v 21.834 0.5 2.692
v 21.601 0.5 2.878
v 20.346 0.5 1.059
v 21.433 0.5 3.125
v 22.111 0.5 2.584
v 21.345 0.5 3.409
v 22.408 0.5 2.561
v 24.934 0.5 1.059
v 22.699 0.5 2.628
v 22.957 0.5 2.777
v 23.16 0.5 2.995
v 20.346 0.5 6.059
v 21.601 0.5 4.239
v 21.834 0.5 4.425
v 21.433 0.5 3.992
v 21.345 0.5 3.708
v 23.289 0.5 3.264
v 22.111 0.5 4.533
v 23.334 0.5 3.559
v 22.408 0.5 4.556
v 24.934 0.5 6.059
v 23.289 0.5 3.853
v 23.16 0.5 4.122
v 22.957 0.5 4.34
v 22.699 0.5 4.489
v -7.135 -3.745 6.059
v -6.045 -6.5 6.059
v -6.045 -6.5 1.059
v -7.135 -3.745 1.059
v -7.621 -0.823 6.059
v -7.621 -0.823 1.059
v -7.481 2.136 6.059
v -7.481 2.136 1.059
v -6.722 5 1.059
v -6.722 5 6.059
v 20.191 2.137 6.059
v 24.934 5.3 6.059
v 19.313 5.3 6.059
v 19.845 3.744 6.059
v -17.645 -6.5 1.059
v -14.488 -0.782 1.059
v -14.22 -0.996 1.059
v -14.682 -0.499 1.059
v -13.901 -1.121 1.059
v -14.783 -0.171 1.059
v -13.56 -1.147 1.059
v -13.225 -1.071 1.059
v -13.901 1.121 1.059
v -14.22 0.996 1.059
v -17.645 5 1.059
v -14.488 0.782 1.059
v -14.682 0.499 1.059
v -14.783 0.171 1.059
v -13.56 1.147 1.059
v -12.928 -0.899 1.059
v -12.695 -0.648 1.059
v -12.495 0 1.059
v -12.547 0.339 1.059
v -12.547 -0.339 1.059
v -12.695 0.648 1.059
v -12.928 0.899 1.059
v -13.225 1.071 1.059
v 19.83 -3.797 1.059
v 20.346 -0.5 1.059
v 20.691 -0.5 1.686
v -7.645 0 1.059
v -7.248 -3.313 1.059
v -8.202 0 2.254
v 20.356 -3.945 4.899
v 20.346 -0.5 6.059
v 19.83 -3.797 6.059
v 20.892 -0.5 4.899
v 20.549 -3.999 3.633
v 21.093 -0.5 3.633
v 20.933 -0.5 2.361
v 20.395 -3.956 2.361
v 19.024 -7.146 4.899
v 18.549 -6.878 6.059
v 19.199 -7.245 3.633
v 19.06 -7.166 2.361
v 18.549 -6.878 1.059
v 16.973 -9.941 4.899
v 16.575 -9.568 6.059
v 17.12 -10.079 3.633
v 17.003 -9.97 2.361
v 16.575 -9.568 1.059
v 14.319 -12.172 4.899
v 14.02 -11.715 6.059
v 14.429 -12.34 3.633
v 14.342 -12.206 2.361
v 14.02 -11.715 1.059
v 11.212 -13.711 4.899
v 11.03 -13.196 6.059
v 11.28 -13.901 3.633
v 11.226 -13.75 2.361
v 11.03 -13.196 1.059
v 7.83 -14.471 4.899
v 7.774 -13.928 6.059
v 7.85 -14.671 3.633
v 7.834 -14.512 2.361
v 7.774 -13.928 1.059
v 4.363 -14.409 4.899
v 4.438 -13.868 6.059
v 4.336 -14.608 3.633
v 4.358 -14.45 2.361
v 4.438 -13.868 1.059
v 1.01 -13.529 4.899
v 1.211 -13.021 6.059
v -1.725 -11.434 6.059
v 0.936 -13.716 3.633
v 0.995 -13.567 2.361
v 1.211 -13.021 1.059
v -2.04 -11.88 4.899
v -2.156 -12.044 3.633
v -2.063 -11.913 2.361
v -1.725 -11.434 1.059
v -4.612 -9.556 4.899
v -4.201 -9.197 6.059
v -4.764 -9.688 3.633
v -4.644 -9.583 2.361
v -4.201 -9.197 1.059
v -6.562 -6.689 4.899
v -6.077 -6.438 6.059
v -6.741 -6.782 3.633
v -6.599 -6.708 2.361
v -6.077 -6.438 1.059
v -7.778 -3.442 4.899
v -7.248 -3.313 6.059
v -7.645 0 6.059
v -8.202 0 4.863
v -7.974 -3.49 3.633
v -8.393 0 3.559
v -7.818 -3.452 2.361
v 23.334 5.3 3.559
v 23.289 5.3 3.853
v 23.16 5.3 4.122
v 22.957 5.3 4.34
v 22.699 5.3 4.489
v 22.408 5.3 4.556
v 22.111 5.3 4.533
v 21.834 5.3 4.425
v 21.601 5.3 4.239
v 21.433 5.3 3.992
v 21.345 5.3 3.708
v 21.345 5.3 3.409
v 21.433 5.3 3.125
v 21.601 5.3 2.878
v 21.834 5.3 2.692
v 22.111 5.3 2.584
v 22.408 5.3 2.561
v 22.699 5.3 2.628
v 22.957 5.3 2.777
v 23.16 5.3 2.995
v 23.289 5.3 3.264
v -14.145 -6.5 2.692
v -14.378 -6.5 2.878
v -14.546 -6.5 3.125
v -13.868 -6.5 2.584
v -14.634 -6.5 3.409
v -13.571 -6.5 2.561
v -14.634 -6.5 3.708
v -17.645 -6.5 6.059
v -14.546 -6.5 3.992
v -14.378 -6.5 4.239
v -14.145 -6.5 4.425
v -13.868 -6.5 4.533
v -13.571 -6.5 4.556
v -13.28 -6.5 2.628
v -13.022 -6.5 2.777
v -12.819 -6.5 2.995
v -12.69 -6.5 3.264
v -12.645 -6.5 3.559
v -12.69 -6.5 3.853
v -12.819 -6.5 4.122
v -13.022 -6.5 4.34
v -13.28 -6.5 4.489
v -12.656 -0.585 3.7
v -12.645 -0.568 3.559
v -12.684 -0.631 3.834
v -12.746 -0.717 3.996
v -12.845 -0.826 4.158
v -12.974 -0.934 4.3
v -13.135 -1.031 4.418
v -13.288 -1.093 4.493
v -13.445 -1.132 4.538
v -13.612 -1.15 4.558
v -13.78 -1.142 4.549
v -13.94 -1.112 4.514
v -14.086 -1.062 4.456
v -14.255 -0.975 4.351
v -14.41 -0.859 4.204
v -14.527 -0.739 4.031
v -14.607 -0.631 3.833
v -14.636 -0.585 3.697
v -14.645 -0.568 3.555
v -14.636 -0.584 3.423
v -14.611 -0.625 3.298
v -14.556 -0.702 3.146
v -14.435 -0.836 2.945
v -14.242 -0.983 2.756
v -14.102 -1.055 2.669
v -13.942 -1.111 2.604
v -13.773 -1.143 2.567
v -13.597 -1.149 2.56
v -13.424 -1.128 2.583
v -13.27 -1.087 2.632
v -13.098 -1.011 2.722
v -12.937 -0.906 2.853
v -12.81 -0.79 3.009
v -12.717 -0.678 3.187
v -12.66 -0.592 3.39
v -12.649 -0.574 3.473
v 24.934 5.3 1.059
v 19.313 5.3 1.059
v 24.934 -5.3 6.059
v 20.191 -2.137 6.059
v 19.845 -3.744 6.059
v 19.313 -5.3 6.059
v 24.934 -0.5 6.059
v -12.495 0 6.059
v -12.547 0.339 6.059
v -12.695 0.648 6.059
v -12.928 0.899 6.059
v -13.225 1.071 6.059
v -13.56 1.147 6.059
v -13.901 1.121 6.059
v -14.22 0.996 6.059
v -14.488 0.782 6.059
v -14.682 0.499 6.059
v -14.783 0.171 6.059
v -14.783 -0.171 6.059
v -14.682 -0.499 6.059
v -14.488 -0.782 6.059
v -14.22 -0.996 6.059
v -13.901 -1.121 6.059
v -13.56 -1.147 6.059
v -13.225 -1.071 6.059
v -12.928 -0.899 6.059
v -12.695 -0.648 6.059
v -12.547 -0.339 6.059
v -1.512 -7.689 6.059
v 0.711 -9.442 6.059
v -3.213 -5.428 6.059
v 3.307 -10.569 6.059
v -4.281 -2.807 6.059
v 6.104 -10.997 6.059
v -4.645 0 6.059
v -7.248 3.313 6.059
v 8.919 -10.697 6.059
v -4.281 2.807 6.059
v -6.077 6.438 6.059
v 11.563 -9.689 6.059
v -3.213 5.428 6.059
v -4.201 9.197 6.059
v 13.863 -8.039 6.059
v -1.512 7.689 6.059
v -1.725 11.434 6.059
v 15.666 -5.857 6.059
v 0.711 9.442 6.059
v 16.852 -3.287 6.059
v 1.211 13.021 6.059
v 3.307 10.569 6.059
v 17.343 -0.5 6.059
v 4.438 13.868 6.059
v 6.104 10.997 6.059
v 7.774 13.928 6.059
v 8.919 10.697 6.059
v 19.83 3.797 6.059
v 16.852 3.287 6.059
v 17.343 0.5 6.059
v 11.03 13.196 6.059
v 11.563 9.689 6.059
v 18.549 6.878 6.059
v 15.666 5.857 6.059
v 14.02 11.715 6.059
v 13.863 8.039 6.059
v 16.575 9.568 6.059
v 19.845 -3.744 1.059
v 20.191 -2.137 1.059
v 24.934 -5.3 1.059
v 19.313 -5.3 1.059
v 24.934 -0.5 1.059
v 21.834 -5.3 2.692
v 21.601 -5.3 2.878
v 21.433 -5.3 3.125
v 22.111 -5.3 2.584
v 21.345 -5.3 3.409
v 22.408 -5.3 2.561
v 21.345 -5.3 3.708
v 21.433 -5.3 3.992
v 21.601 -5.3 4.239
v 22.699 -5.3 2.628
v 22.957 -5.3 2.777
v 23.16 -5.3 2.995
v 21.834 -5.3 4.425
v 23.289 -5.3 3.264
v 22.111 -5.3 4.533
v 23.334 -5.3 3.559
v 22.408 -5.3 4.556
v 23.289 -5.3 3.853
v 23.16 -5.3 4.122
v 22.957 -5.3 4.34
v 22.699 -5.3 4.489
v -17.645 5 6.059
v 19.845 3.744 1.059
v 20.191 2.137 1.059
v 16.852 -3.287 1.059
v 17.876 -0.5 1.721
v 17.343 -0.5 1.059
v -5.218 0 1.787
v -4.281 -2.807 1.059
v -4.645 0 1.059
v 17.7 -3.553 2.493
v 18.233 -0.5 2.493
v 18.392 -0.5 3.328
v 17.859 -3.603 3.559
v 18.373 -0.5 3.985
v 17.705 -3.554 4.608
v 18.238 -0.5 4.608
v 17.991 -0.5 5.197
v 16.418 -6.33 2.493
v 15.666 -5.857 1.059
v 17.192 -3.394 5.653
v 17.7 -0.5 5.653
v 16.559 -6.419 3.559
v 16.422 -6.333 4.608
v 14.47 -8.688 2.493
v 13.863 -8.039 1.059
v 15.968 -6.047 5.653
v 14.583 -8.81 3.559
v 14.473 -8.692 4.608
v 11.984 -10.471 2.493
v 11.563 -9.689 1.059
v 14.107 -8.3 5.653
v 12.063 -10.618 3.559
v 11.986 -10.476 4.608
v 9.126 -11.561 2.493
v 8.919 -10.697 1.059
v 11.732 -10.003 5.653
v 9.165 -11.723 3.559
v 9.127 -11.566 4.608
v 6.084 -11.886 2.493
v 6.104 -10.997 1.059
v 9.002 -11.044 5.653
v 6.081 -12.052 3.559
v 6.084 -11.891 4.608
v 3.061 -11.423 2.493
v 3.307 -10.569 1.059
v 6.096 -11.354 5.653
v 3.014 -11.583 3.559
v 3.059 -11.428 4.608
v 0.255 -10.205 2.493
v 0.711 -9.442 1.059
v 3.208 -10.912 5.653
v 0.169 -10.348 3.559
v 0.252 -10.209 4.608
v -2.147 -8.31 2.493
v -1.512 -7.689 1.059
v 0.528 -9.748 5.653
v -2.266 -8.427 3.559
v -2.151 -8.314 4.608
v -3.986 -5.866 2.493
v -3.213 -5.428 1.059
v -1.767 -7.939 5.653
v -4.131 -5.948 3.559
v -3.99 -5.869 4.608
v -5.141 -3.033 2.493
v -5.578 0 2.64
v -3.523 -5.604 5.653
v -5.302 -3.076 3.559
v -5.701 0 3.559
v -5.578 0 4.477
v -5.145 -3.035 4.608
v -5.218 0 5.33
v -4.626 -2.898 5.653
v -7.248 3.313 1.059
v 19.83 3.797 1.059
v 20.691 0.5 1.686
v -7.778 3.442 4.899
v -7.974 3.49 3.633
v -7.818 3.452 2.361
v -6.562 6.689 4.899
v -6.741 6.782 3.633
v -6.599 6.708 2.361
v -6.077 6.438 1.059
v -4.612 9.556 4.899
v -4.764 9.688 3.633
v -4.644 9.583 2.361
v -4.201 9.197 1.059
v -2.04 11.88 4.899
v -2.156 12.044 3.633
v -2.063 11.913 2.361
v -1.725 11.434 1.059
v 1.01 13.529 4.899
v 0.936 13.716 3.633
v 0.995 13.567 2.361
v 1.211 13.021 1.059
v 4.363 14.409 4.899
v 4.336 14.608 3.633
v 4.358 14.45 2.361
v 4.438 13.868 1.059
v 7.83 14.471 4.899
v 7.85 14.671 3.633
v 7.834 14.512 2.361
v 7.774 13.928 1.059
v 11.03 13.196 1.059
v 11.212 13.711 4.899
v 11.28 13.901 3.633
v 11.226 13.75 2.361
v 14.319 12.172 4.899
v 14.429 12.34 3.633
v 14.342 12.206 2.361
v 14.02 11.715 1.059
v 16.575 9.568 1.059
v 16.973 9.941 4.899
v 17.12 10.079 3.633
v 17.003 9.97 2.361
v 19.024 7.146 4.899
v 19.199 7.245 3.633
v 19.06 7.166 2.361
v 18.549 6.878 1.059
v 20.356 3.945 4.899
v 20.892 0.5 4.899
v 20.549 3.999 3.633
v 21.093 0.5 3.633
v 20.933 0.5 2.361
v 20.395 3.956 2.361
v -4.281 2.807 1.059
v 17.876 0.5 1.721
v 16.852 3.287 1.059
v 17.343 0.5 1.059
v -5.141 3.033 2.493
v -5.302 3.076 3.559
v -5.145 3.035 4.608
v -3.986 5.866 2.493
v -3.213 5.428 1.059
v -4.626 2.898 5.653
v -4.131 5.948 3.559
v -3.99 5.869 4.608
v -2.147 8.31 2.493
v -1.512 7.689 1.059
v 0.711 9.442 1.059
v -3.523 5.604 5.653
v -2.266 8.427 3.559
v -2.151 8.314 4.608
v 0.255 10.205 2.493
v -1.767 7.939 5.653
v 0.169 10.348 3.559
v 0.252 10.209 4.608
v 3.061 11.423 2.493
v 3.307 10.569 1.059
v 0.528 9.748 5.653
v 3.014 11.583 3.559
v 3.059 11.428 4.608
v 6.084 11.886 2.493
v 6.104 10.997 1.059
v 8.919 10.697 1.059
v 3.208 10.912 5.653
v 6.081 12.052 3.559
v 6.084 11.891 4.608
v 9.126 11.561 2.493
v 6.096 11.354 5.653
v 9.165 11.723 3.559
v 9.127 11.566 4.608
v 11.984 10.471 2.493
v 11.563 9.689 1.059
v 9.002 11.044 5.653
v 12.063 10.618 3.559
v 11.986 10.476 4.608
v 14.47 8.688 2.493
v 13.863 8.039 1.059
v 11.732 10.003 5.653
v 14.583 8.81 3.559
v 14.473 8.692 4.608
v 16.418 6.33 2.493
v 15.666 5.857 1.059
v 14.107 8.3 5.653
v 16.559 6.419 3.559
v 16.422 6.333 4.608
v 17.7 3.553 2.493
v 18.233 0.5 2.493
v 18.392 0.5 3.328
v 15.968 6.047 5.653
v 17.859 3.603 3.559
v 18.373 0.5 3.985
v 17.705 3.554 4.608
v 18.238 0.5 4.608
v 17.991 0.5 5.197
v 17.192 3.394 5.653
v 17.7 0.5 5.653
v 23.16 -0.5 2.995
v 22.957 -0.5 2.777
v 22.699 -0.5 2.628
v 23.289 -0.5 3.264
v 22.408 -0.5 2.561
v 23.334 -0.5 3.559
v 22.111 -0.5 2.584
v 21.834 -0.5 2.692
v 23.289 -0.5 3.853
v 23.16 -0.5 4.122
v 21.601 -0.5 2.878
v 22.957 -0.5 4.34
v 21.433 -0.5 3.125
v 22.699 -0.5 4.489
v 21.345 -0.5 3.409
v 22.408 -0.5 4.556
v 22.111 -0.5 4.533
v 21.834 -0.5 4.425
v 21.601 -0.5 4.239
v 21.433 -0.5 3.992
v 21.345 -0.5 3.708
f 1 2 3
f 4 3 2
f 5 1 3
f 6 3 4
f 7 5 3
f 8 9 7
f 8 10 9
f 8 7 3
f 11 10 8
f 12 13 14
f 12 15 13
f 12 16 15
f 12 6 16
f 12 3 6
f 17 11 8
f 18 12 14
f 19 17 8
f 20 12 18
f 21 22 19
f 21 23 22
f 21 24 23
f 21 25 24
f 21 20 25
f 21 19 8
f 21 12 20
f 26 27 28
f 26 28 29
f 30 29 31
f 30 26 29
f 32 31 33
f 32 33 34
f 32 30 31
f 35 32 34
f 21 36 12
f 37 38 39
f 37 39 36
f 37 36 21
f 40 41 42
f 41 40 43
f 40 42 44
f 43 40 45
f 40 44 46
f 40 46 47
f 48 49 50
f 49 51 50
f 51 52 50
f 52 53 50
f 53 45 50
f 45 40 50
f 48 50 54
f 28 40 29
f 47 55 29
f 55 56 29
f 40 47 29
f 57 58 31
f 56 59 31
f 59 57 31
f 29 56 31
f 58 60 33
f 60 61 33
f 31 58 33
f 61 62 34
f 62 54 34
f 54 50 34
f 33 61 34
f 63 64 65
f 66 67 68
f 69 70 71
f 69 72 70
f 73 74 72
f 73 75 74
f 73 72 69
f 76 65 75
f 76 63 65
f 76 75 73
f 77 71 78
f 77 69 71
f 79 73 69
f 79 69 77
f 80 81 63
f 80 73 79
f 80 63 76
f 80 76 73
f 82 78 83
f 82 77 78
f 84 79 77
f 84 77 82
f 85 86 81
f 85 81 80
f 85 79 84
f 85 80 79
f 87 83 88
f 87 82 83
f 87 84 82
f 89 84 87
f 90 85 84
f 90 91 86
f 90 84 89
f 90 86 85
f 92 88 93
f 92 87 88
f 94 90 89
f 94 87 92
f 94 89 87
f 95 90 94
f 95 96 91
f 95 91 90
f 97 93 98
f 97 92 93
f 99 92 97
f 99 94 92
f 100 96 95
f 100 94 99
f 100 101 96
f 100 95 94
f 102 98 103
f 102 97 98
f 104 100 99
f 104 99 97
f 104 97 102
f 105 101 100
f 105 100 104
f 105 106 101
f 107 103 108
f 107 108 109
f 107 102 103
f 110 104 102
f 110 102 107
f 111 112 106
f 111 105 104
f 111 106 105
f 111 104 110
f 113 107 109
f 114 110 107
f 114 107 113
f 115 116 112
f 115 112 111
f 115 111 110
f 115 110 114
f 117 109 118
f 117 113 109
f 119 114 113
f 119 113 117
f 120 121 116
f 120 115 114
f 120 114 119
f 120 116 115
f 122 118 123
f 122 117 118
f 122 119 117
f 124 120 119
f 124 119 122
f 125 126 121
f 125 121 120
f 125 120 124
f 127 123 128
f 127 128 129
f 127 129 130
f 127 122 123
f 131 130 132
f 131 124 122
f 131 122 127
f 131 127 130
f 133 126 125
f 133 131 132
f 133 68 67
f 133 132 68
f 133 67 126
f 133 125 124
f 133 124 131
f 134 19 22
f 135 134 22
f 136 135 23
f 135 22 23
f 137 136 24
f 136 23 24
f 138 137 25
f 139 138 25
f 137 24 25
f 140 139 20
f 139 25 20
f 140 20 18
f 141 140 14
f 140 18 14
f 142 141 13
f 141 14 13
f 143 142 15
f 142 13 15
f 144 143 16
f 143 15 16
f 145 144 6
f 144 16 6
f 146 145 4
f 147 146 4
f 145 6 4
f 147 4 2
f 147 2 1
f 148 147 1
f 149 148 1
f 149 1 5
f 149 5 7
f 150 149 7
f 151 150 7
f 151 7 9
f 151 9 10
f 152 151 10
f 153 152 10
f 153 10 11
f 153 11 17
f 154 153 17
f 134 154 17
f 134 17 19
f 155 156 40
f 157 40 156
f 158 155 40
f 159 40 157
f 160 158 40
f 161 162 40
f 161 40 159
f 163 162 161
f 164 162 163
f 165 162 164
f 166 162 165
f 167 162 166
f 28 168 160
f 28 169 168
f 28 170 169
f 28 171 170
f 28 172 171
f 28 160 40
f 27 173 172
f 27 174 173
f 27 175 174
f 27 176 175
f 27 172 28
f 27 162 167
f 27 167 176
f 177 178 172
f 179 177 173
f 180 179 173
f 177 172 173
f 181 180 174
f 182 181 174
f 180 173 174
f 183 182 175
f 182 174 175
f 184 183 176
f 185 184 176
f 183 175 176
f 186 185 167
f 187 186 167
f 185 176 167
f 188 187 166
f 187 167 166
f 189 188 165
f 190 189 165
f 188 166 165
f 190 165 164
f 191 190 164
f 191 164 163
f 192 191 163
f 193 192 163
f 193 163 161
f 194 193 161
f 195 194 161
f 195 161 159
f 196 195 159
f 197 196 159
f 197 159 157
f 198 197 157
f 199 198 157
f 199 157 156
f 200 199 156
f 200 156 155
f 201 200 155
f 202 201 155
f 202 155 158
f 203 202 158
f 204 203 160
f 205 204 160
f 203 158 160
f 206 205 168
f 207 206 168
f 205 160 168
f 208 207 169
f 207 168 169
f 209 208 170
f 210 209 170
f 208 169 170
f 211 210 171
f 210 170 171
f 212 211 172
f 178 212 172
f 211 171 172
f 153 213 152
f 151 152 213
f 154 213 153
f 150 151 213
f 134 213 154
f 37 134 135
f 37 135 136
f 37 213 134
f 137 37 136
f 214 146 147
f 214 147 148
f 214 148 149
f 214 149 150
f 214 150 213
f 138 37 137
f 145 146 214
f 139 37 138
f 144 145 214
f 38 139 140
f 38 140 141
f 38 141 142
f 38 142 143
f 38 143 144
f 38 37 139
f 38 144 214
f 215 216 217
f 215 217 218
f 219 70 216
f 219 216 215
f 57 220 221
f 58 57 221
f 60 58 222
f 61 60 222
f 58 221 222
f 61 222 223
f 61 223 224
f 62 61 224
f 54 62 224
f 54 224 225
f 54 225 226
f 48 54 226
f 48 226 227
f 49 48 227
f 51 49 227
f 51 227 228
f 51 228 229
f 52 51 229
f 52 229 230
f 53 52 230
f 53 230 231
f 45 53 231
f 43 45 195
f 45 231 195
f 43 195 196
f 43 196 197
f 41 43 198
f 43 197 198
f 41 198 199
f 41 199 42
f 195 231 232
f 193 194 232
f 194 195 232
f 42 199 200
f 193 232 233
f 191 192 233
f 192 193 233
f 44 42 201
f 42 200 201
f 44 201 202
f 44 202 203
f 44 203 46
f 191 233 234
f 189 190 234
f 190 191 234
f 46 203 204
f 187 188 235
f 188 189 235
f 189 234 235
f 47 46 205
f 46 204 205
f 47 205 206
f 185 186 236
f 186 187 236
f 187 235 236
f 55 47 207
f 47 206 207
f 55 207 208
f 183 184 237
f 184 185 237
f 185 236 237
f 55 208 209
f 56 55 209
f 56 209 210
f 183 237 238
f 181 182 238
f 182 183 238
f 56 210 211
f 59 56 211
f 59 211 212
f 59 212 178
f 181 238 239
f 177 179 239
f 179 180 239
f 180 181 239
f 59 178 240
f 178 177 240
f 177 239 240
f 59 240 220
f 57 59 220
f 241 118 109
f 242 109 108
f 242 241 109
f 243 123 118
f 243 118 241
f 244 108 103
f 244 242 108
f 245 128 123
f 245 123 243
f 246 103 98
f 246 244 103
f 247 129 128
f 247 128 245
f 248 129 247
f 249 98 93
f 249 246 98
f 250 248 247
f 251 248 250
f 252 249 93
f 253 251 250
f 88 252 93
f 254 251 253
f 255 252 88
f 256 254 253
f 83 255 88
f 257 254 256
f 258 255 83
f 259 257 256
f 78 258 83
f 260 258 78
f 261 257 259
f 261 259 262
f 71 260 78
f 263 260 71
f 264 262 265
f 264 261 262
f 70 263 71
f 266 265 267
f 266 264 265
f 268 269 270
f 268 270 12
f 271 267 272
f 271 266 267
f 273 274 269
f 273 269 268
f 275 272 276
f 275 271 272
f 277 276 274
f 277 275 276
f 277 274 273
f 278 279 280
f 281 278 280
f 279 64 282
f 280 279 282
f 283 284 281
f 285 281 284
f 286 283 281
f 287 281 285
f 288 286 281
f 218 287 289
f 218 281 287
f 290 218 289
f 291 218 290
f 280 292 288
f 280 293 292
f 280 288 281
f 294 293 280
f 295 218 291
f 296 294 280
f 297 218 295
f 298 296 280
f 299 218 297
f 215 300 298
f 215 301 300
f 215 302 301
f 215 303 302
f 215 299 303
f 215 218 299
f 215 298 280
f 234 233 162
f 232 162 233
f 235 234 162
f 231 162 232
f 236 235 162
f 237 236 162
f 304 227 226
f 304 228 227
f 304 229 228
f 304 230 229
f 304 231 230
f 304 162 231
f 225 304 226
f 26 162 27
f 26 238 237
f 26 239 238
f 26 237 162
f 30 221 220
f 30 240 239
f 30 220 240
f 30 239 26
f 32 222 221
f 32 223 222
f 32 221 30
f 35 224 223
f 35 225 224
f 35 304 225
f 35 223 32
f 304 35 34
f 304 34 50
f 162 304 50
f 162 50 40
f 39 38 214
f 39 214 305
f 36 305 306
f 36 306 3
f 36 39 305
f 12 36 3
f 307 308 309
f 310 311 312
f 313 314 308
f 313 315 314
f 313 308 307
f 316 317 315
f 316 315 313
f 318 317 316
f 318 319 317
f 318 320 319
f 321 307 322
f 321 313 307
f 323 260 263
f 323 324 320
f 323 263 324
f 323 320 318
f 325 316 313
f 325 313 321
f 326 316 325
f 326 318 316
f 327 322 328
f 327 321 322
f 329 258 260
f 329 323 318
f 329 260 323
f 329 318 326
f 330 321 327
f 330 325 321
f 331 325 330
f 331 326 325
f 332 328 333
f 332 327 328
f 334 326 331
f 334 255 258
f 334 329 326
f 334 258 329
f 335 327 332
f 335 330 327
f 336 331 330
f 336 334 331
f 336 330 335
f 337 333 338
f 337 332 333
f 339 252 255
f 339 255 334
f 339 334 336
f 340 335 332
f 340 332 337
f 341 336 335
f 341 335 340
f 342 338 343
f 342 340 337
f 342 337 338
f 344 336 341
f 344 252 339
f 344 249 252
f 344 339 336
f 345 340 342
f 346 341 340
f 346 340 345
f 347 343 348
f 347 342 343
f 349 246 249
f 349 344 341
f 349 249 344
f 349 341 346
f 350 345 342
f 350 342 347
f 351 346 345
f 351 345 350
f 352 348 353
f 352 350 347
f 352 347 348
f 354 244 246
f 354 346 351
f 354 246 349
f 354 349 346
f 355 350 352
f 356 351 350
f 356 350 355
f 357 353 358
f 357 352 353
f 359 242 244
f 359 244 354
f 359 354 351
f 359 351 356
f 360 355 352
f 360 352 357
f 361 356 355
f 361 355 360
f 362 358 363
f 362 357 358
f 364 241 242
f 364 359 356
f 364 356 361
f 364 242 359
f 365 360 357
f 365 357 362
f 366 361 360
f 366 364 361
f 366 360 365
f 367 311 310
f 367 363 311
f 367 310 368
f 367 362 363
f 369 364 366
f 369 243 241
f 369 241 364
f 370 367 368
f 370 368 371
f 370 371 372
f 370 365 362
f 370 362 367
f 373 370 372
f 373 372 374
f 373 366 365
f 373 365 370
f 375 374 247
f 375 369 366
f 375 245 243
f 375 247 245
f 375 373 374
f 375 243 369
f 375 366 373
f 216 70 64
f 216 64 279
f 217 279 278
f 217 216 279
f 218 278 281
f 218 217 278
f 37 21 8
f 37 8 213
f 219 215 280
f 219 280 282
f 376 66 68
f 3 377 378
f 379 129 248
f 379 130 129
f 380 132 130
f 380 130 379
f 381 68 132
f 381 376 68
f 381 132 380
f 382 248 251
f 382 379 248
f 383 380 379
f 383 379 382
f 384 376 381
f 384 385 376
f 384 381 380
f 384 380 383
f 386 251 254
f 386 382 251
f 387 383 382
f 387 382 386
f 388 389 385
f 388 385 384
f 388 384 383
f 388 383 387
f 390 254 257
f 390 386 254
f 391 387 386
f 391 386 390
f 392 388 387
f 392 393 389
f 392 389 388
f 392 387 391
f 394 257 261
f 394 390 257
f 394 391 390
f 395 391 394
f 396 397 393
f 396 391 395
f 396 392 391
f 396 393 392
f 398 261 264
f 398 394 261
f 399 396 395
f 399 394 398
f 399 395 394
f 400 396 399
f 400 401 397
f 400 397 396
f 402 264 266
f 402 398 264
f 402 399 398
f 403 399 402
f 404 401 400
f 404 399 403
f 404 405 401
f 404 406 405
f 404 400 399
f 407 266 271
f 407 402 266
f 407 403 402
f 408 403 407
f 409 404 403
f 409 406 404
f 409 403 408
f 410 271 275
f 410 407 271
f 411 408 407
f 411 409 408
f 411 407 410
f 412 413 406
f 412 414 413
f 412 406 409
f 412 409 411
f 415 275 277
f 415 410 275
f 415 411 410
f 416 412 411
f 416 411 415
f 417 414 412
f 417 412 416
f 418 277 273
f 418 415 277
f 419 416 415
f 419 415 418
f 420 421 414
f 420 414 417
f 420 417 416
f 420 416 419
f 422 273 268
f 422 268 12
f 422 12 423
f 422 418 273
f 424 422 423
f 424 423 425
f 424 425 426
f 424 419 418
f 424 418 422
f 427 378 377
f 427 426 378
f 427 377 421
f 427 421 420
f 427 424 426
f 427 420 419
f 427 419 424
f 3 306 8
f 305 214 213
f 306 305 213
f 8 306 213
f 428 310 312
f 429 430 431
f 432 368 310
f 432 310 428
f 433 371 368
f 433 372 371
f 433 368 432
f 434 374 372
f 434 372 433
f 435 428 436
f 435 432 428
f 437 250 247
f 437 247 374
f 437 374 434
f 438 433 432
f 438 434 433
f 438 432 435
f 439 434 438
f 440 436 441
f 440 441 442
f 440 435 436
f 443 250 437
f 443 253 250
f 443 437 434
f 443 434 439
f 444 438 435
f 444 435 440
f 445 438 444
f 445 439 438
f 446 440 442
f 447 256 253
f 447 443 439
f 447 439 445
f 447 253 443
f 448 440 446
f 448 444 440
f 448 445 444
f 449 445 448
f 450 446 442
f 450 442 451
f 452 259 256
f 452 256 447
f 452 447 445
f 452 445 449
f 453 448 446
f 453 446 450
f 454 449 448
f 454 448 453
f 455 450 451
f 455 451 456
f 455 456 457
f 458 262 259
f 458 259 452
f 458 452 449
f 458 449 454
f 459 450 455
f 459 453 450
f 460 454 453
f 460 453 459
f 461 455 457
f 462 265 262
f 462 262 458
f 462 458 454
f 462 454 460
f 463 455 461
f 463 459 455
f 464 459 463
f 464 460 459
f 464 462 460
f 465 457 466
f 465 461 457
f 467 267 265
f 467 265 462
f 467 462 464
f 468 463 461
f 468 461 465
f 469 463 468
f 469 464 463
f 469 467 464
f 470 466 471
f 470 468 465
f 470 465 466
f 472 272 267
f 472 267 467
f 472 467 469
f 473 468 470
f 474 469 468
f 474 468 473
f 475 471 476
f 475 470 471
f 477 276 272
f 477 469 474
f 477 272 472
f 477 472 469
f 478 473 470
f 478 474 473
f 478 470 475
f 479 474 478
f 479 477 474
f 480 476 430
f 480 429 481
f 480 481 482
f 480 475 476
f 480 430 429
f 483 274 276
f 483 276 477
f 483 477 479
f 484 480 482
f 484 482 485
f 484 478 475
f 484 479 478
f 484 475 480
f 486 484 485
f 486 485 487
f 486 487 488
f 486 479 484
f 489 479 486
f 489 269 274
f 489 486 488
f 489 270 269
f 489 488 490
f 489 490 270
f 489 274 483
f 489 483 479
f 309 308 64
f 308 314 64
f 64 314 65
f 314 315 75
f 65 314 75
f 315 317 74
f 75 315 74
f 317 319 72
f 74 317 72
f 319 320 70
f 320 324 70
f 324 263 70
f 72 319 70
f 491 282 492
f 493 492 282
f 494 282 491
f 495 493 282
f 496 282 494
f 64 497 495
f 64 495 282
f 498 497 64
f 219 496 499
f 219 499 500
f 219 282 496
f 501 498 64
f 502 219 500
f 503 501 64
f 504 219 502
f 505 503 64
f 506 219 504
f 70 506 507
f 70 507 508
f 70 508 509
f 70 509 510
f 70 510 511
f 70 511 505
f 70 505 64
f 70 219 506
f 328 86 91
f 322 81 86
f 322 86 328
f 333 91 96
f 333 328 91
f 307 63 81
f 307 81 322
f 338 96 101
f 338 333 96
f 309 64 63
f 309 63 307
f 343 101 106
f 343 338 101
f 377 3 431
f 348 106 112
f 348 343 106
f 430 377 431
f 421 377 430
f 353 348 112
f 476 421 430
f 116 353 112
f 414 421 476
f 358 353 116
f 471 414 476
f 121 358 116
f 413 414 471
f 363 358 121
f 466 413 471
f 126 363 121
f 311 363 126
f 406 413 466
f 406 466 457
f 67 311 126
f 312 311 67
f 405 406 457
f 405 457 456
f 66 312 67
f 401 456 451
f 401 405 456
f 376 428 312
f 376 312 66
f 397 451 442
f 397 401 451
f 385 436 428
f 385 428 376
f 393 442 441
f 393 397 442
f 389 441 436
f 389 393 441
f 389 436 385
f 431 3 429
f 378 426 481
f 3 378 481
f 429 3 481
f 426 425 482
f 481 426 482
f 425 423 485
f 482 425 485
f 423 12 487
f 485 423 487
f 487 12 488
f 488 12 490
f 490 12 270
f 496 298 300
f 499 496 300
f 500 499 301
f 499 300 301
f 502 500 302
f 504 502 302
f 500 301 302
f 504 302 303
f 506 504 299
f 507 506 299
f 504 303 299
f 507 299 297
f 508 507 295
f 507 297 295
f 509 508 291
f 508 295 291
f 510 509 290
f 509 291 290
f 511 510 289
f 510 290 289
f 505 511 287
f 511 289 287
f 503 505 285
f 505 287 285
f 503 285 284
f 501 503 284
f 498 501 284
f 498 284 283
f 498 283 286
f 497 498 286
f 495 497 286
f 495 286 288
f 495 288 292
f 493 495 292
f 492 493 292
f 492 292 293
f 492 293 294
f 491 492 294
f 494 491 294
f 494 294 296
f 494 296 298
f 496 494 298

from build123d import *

# Parameters (mm, degrees)
F2_R      = 1.15
F3_DEPTH  = 5
F4_R      = 1
F5_DEPTH  = 6
F6_R      = 1
F7_DEPTH  = 25
F8_R      = 1
F9_DEPTH  = 25
F11_DEPTH = 25


with BuildPart() as f1:
    # F0 (on Front) → F1 (revolve)
    with BuildSketch(Plane.XZ):
        with BuildLine():
            ThreePointArc((-4.645441286, 1.0585224686), (-5.700841589, 3.5585224686), (-4.645441286, 6.0585224686))
            ThreePointArc((-4.645441286, 6.0585224686), (-7.145441286, 3.5585224686), (-4.645441286, 1.0585224686))
        make_face()
        with BuildLine():
            ThreePointArc((-4.645441286, 1.0585224686), (-7.145441286, 3.5585224686), (-4.645441286, 6.0585224686))
            Line((-4.645441286, 6.0585224686), (-7.645441286, 6.0585224686))
            Line((-7.645441286, 6.0585224686), (-7.645441286, 1.0585224686))
            Line((-7.645441286, 1.0585224686), (-4.645441286, 1.0585224686))
        make_face()
        with BuildLine():
            Line((-7.645441286, 1.0585224686), (-7.645441286, 6.0585224686))
            ThreePointArc((-7.645441286, 6.0585224686), (-8.3932641999, 3.5585224686), (-7.645441286, 1.0585224686))
        make_face()
    revolve(axis=Axis((6.354558714, 0, 2.7198808384), (0, 0, -1)))

    # F8 (on face) → F9 (cut)
    with BuildSketch(Plane(origin=(0, 5.3, 0), x_dir=(-1, 0, 0), z_dir=(0, 1, 0))):
        with Locations((-22.3337602671, 3.5585224686)):
            Circle(F8_R)
    extrude(amount=-F9_DEPTH, mode=Mode.SUBTRACT)

    # F10 (on face) → F11 (cut)
    with BuildSketch(Plane.XY.offset(6.0585224686)):
        with BuildLine():
            ThreePointArc((20.354558714, 0), (20.3523256808, 0.250039882), (20.3456272937, 0.5))
            Line((20.3456272937, 0.5), (17.3431892019, 0.5))
            ThreePointArc((17.3431892019, 0.5), (17.3517159687, 0.2500646245), (17.354558714, 0))
            ThreePointArc((17.354558714, 0), (17.3517159687, -0.2500646245), (17.3431892019, -0.5))
            Line((17.3431892019, -0.5), (20.3456272937, -0.5))
            ThreePointArc((20.3456272937, -0.5), (20.3523256808, -0.250039882), (20.354558714, 0))
        make_face()
        with BuildLine():
            Line((21.9472598002, -0.5), (21.9472598002, 0.5))
            Line((21.9472598002, 0.5), (20.3456272937, 0.5))
            ThreePointArc((20.3456272937, 0.5), (20.3523256808, 0.250039882), (20.354558714, 0))
            ThreePointArc((20.354558714, 0), (20.3523256808, -0.250039882), (20.3456272937, -0.5))
            Line((20.3456272937, -0.5), (21.9472598002, -0.5))
        make_face()
    extrude(amount=-F11_DEPTH, mode=Mode.SUBTRACT)


with BuildPart() as f3:
    # F2 (on face) → F3 (new body)
    with BuildSketch(Plane.XY.offset(6.0585224686)):
        with BuildLine():
            Line((-17.645441286, -6.5), (-6.0450380536, -6.5))
            ThreePointArc((-6.0450380536, -6.5), (-7.6212376453, -0.8228706604), (-6.7221381166, 5))
            Line((-6.7221381166, 5), (-17.645441286, 5))
            Line((-17.645441286, 5), (-17.645441286, -6.5))
        make_face()
        with Locations((-13.645441286, 0)):
            Circle(F2_R, mode=Mode.SUBTRACT)
    extrude(amount=-F3_DEPTH)

    # F4 (on face) → F5 (cut)
    with BuildSketch(Plane.XZ.offset(6.5)):
        with Locations((-13.645441286, 3.5585224686)):
            Circle(F4_R)
    extrude(amount=-F5_DEPTH, mode=Mode.SUBTRACT)


with BuildPart() as f3b:
    # F2 (on face) → F3, piece 2 (new body)
    with BuildSketch(Plane.XY.offset(6.0585224686)):
        with BuildLine():
            Line((24.9337602671, -0.5), (20.3456272937, -0.5))
            ThreePointArc((20.3456272937, -0.5), (20.0411651974, -2.945641351), (19.3125678204, -5.3))
            Line((19.3125678204, -5.3), (24.9337602671, -5.3))
            Line((24.9337602671, -5.3), (24.9337602671, -0.5))
        make_face()
    extrude(amount=-F3_DEPTH)


with BuildPart() as f3c:
    # F2 (on face) → F3, piece 3 (new body)
    with BuildSketch(Plane.XY.offset(6.0585224686)):
        with BuildLine():
            ThreePointArc((19.3125678204, 5.3), (20.0411651974, 2.945641351), (20.3456272937, 0.5))
            Line((20.3456272937, 0.5), (24.9337602671, 0.5))
            Line((24.9337602671, 0.5), (24.9337602671, 5.3))
            Line((24.9337602671, 5.3), (19.3125678204, 5.3))
        make_face()
    extrude(amount=-F3_DEPTH)


with BuildPart() as f7_tool:
    # F6 (on face) → F7 (new body)
    with BuildSketch(Plane.XZ.offset(5.3)):
        with Locations((22.3337602671, 3.5585224686)):
            Circle(F6_R)
    extrude(amount=-F7_DEPTH)


with BuildPart() as f3b_1:
    add(f3b.part)

    # F7: cut by f7_tool
    add(f7_tool.part, mode=Mode.SUBTRACT)


with BuildPart() as f3c_1:
    add(f3c.part)

    # F7: cut by f7_tool
    add(f7_tool.part, mode=Mode.SUBTRACT)


solid = Compound([f1.part, f3.part, f3b_1.part, f3c_1.part])
